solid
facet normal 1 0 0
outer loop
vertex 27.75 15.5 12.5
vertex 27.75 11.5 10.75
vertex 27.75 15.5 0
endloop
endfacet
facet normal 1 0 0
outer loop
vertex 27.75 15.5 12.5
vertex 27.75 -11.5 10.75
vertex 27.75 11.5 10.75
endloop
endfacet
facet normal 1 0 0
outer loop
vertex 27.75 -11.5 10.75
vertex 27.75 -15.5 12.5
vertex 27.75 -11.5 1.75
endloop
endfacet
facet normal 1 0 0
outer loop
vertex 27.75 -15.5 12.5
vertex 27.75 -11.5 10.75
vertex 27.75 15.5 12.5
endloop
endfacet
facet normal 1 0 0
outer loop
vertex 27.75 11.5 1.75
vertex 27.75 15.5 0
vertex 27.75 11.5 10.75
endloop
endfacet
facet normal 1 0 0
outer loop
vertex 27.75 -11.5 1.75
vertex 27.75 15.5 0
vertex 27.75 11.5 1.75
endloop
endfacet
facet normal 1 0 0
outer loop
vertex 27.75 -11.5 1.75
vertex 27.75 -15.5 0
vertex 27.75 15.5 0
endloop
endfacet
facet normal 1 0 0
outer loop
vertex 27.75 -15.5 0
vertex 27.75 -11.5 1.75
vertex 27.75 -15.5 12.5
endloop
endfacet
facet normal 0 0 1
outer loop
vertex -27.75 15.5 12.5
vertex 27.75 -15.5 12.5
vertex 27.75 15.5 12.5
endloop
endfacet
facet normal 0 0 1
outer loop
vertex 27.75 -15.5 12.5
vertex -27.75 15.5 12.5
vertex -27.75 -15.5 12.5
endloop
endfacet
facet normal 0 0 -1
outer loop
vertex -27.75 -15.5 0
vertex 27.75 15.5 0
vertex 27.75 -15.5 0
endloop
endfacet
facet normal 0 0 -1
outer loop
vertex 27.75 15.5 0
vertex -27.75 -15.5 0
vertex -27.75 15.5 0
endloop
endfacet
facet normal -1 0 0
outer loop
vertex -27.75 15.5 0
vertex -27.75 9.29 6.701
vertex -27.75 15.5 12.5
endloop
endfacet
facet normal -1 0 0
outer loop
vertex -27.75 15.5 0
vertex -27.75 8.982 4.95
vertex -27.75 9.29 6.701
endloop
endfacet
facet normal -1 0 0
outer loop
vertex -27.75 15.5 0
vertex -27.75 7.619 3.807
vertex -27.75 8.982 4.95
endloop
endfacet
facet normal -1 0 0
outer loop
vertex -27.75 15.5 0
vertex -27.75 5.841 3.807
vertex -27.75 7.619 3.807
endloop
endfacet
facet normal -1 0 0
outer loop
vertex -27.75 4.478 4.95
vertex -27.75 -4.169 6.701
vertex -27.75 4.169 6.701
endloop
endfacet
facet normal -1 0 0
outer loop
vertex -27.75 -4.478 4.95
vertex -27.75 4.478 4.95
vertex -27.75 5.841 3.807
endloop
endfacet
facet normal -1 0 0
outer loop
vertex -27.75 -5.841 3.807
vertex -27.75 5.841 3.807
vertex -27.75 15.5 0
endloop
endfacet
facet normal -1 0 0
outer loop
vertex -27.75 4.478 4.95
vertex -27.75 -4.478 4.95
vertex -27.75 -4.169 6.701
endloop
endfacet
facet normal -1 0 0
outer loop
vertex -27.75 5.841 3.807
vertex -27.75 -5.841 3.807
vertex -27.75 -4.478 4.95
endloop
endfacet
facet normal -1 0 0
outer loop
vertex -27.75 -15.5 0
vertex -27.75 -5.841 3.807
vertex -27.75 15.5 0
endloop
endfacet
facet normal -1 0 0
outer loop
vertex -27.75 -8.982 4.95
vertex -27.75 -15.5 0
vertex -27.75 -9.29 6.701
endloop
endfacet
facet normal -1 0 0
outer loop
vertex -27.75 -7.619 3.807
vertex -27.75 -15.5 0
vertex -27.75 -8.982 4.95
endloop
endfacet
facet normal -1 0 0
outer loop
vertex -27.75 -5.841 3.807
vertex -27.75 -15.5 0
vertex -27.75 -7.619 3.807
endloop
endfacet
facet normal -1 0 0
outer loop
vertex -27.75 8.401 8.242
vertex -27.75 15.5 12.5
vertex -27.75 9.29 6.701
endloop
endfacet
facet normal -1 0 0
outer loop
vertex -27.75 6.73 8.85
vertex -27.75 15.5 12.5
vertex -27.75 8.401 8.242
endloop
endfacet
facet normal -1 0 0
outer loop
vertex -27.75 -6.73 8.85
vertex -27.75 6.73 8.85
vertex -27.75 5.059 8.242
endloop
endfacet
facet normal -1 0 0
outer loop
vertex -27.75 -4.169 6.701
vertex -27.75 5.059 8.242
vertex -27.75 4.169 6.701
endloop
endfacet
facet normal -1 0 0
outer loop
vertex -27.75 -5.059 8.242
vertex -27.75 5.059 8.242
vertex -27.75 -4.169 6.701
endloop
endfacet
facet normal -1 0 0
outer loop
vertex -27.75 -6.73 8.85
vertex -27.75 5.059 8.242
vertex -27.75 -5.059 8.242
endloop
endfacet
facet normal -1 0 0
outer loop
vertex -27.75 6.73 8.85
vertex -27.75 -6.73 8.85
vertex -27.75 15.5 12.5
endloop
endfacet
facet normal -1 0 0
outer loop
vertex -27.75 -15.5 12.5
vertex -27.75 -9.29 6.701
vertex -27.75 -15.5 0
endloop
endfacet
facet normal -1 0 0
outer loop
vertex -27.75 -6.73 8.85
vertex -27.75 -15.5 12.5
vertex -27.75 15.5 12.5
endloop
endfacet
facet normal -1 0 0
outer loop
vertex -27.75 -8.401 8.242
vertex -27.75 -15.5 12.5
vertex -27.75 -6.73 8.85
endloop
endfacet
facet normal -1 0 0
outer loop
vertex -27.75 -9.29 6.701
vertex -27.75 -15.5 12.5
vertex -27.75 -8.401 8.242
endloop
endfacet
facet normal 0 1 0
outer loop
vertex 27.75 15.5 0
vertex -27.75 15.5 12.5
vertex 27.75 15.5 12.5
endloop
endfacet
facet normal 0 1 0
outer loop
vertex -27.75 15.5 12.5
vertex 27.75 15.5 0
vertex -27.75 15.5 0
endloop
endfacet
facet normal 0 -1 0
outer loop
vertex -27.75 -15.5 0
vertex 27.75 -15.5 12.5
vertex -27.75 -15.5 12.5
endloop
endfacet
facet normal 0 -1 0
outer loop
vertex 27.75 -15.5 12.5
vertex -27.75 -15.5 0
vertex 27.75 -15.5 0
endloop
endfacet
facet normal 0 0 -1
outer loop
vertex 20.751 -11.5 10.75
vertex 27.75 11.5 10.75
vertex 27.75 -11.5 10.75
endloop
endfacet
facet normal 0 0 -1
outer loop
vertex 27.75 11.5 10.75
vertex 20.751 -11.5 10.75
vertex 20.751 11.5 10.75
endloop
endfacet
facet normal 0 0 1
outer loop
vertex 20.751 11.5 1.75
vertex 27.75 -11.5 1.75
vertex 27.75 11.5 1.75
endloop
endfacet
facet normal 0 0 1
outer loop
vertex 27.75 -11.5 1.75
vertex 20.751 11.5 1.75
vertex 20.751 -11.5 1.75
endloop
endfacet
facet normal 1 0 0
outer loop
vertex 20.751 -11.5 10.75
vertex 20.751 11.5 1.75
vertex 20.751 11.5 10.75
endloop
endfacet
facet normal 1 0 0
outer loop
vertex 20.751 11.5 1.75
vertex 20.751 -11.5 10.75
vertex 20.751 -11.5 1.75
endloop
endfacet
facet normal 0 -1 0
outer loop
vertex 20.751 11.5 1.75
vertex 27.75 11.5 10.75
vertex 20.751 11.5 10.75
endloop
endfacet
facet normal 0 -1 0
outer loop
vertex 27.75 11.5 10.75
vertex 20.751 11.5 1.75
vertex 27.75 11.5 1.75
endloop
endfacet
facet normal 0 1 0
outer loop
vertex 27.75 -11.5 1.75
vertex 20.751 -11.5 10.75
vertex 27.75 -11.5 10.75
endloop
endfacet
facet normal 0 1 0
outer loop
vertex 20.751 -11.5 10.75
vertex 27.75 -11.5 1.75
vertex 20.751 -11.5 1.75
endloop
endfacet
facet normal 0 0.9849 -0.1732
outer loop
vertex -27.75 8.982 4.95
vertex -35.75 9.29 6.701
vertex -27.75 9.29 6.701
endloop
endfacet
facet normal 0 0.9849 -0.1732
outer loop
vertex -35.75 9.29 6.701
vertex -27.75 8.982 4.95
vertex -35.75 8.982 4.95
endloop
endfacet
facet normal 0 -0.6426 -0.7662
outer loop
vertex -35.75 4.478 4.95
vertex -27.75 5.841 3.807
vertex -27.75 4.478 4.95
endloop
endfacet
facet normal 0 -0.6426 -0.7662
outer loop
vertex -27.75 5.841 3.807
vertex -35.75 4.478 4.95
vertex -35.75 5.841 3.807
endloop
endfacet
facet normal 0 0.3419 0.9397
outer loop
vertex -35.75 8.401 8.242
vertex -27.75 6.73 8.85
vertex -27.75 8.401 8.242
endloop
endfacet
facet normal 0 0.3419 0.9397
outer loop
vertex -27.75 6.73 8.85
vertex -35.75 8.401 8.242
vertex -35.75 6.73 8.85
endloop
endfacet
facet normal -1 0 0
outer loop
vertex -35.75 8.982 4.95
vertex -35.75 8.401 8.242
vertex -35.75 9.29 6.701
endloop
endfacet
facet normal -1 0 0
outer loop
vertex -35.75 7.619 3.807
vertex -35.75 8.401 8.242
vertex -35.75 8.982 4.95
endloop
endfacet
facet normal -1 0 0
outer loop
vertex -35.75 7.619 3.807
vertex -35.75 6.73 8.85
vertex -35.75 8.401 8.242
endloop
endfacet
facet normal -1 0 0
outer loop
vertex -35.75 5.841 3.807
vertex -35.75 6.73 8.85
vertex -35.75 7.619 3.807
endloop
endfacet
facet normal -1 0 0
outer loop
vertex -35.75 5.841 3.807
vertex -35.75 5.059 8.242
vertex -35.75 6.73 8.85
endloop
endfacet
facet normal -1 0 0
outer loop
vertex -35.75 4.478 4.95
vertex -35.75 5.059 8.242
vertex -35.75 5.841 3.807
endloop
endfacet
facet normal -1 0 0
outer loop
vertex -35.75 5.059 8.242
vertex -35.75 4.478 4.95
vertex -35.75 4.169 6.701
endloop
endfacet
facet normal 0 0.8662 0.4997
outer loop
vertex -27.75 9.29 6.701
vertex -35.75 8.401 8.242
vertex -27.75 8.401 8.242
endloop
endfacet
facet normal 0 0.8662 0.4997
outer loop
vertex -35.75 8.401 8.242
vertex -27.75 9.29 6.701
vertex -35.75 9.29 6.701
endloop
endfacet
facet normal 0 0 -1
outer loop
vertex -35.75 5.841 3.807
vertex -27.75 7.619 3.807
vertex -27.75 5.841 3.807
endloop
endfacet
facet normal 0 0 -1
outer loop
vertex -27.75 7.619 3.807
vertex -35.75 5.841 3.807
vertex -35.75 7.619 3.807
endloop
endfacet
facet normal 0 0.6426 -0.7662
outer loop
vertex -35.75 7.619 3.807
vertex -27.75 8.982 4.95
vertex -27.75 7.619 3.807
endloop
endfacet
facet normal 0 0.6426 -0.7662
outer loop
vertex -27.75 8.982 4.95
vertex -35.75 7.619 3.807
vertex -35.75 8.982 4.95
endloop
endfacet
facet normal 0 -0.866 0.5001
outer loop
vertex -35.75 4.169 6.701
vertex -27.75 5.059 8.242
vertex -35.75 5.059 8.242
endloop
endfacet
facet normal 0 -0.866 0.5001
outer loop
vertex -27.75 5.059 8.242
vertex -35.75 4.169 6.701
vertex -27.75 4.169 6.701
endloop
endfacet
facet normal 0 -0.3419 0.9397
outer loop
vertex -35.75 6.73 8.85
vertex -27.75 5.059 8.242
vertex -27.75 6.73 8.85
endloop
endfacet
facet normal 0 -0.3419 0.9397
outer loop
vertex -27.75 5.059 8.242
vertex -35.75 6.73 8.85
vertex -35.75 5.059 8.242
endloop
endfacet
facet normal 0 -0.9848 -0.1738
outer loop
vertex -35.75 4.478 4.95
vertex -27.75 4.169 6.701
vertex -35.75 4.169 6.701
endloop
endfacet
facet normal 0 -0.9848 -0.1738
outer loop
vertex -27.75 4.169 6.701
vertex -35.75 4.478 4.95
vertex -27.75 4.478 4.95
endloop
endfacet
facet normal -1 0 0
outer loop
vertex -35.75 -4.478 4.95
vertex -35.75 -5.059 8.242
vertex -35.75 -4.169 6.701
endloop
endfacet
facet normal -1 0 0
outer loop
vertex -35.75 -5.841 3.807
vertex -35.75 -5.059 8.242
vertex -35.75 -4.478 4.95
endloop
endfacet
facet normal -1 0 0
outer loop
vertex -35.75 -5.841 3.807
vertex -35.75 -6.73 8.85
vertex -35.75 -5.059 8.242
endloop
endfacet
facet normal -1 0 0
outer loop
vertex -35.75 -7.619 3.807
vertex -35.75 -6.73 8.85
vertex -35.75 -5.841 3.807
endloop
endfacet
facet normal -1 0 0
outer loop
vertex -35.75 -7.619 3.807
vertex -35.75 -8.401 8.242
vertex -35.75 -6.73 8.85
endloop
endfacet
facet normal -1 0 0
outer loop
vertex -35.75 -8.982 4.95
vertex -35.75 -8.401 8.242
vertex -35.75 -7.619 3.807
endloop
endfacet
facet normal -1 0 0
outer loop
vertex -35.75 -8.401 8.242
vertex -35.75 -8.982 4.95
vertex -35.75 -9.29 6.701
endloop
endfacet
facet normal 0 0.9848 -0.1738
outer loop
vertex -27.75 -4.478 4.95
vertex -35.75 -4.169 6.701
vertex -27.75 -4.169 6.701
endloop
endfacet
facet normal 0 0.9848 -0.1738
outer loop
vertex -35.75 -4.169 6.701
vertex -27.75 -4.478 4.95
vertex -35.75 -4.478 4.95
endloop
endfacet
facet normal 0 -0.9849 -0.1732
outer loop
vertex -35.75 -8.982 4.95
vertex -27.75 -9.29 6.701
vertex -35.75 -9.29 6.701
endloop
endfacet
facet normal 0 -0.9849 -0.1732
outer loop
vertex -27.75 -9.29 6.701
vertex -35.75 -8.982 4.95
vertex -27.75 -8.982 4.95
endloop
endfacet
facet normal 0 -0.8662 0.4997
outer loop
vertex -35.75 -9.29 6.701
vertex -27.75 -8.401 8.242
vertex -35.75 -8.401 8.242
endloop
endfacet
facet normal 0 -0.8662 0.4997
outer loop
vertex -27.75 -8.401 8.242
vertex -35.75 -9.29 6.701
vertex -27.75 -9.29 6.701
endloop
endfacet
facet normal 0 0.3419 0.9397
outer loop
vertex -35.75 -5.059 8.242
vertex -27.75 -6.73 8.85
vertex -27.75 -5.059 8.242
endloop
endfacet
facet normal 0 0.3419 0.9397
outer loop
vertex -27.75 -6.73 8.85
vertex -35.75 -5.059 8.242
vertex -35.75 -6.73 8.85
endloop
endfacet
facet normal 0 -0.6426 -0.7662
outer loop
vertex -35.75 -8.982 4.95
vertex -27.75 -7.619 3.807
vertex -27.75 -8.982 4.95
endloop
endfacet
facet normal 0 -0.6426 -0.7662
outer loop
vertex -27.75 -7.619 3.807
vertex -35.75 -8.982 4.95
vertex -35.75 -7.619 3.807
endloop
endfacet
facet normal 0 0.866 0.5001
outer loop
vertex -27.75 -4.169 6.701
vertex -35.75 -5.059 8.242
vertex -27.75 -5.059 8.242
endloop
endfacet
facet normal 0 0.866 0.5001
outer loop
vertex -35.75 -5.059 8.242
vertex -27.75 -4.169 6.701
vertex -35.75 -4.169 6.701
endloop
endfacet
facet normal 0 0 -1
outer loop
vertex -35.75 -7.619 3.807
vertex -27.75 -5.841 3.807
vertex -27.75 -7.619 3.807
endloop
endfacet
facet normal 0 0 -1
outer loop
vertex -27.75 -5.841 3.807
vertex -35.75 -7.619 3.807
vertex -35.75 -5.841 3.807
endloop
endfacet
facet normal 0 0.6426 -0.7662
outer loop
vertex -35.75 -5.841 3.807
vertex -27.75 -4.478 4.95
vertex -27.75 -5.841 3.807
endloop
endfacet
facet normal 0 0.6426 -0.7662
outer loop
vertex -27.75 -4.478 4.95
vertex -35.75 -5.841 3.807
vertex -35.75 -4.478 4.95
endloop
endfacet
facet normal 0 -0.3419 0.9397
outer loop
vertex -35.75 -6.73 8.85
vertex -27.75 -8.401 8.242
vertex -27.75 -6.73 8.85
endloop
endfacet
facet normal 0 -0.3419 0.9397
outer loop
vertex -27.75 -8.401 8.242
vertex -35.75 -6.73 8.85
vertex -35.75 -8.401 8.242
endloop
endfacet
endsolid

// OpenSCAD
// file: core.scad
SMALL_NUMBER = 0.001;

module HexScrew(length, m = 3) {
    color("grey") {
        cylinder(m+0.001, m*.9, m*.9, center = false);
        translate([0, 0, -length]) cylinder(length+.01, d1 = m, d2 = m, center = false);
    }
}

module HexScrewHeadClearance(m = 3) {
    cylinder(m * 2, m*2, 1, center = false);
}

module HexScrewConnection(m = 3, length = 20, cut = 10.001) {
    cylinder(cut, m*.9, m+(cut/5), center = false);
    HexScrew(length, m);
}

module SquareOf(size, rotate = 0) {
    offset = size / 2;

    rotate(rotate) translate([offset, offset]) rotate(-rotate) children(0);
    rotate(90 + rotate) translate([offset, offset]) rotate(-rotate) children(0);
    rotate(180 + rotate) translate([offset, offset]) rotate(-rotate) children(0);
    rotate(270 + rotate) translate([offset, offset]) rotate(-rotate) children(0);
}

module PaddedCube(size = [1, 1, 1], pad = 0, center = false) {
    new_size = [size[0] + pad, size[1] + pad, size[2] + pad];
    if (center)
        cube(new_size, center = true);
    else
        translate([-pad/2, -pad/2, -pad/2])
            cube(new_size, center = false);
}

HexScrew(50, m = 10);

translate([30, 0, 0]) {
    color("red") HexScrew(20, m = 3);
    color("blue") HexScrewHeadClearance(3);
}
// main file
use <core.scad>

// length, width, height;
crossfire_size = [55.5, 31.0, 12.5];
plug_hole = [7, 23, 9];

antenne_plug_radius = 5.2 / 2;
antenne_seperation = 18.66 - antenne_plug_radius * 2;
antenne_length = 8;

module CrossfireBox(pad = 0) {
    translate([-crossfire_size[0]/2, -crossfire_size[1]/2])
        PaddedCube(crossfire_size, pad);
}

module Crossfire() {
    color("blue")
    difference() {
        CrossfireBox(pad = 0);

        translate([crossfire_size[0]/2 + 0.001 - plug_hole[0], -plug_hole[1]/2, (crossfire_size[2] - plug_hole[2])/2])
        cube(plug_hole);
    }
        
    translate([-crossfire_size[0]/2, 0]) {
        translate([0, antenne_seperation/2, crossfire_size[2]/2])
        rotate([0, -90]) 
        cylinder(8,antenne_plug_radius, antenne_plug_radius, center = false);

        translate([0, -antenne_seperation/2, crossfire_size[2]/2])
        rotate([0, -90]) 
        cylinder(8,antenne_plug_radius, antenne_plug_radius, center = false);
    }
}

Crossfire();
